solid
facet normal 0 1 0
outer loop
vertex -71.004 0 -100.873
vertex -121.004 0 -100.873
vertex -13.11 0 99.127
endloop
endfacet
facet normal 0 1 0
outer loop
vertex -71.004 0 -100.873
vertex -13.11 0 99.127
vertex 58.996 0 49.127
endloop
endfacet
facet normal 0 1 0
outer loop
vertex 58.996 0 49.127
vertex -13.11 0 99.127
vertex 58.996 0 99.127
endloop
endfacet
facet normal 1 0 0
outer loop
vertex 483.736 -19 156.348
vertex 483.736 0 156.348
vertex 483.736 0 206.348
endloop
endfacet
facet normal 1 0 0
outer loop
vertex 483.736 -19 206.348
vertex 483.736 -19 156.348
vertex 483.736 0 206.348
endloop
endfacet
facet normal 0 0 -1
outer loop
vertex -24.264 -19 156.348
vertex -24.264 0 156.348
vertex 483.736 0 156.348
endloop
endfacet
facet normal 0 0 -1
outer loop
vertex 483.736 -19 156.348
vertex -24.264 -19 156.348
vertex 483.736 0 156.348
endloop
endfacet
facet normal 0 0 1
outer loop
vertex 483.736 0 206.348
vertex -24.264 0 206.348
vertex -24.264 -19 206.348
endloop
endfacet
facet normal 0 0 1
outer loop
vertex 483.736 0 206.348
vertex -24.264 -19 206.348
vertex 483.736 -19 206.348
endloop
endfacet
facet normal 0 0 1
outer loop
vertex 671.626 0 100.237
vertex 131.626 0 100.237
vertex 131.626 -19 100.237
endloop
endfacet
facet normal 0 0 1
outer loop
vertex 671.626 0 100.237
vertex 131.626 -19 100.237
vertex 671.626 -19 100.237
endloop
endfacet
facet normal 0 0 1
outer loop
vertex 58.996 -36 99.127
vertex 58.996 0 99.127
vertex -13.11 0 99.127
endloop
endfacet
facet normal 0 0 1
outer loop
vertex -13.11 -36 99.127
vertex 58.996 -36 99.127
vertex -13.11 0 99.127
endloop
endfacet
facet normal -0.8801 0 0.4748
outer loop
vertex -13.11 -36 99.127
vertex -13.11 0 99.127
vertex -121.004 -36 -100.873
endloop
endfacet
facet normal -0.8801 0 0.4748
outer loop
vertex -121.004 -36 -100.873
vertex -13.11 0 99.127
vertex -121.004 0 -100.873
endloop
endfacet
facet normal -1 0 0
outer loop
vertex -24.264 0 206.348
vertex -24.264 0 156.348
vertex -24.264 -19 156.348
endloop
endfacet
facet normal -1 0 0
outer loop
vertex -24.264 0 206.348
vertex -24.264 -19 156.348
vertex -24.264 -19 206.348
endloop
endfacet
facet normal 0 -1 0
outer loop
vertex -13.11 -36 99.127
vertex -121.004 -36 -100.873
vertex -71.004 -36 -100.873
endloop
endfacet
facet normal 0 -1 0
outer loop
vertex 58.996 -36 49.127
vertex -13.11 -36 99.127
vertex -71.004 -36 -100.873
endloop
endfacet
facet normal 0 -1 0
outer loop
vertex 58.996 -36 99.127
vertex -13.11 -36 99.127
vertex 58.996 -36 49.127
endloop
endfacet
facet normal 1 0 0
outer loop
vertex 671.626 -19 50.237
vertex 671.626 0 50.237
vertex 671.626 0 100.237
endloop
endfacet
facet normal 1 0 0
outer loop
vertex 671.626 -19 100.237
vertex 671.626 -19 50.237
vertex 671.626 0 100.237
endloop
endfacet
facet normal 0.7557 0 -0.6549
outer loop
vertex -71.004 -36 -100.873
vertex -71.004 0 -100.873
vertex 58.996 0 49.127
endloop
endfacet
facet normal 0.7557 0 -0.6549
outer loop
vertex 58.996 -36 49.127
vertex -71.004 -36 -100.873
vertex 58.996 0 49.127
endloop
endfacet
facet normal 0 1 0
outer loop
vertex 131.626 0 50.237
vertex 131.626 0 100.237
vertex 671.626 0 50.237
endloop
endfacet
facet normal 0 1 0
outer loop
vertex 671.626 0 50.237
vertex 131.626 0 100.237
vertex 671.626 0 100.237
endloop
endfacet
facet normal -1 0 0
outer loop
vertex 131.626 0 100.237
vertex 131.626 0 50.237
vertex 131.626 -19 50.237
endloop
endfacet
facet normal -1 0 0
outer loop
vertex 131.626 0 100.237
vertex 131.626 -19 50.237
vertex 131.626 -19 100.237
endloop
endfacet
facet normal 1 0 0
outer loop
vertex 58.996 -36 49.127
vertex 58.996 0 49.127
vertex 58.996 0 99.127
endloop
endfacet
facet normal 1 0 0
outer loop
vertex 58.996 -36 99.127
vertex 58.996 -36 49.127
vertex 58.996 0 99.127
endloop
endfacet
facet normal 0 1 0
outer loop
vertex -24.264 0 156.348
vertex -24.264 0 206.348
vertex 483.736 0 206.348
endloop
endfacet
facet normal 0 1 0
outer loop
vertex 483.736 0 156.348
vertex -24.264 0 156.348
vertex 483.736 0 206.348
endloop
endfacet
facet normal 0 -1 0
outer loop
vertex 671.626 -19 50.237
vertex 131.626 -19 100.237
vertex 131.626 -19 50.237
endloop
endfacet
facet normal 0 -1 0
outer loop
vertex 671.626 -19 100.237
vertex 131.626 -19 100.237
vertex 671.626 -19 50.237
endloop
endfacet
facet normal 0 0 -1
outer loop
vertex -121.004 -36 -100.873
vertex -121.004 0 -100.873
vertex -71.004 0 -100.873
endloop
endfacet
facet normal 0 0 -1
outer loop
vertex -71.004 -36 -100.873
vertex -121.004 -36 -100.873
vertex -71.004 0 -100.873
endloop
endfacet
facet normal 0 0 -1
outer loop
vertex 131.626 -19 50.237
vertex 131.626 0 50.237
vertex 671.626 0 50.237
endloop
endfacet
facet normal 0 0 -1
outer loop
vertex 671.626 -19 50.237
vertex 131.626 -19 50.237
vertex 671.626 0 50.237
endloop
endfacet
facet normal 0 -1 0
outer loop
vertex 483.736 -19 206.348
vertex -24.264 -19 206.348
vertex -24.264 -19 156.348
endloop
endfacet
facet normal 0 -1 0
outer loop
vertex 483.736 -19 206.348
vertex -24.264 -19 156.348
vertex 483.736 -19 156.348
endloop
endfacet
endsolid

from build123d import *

# Parameters (mm, degrees)
F1_DEPTH = 36
F2_W     = 540
F2_H     = 50
F3_DEPTH = 19
F4_W     = 508
F4_H     = 50
F5_DEPTH = 19


with BuildPart() as f1:
    # F0 (on Front) → F1 (new body)
    with BuildSketch(Plane.XZ):
        Polygon((58.995539, 99.127246), (-13.109745, 99.127246), (-121.004461, -100.872754), (-71.004461, -100.872754), (58.995539, 49.127246), align=None)
    extrude(amount=F1_DEPTH)


with BuildPart() as f3:
    # F2 (on Front) → F3 (new body)
    with BuildSketch(Plane.XZ):
        with Locations((401.626309, 75.236866)):
            Rectangle(F2_W, F2_H)
    extrude(amount=F3_DEPTH)


with BuildPart() as f5:
    # F4 (on Front) → F5 (new body)
    with BuildSketch(Plane.XZ):
        with Locations((229.73565, 181.347743)):
            Rectangle(F4_W, F4_H)
    extrude(amount=F5_DEPTH)


solid = Compound([f1.part, f3.part, f5.part])
